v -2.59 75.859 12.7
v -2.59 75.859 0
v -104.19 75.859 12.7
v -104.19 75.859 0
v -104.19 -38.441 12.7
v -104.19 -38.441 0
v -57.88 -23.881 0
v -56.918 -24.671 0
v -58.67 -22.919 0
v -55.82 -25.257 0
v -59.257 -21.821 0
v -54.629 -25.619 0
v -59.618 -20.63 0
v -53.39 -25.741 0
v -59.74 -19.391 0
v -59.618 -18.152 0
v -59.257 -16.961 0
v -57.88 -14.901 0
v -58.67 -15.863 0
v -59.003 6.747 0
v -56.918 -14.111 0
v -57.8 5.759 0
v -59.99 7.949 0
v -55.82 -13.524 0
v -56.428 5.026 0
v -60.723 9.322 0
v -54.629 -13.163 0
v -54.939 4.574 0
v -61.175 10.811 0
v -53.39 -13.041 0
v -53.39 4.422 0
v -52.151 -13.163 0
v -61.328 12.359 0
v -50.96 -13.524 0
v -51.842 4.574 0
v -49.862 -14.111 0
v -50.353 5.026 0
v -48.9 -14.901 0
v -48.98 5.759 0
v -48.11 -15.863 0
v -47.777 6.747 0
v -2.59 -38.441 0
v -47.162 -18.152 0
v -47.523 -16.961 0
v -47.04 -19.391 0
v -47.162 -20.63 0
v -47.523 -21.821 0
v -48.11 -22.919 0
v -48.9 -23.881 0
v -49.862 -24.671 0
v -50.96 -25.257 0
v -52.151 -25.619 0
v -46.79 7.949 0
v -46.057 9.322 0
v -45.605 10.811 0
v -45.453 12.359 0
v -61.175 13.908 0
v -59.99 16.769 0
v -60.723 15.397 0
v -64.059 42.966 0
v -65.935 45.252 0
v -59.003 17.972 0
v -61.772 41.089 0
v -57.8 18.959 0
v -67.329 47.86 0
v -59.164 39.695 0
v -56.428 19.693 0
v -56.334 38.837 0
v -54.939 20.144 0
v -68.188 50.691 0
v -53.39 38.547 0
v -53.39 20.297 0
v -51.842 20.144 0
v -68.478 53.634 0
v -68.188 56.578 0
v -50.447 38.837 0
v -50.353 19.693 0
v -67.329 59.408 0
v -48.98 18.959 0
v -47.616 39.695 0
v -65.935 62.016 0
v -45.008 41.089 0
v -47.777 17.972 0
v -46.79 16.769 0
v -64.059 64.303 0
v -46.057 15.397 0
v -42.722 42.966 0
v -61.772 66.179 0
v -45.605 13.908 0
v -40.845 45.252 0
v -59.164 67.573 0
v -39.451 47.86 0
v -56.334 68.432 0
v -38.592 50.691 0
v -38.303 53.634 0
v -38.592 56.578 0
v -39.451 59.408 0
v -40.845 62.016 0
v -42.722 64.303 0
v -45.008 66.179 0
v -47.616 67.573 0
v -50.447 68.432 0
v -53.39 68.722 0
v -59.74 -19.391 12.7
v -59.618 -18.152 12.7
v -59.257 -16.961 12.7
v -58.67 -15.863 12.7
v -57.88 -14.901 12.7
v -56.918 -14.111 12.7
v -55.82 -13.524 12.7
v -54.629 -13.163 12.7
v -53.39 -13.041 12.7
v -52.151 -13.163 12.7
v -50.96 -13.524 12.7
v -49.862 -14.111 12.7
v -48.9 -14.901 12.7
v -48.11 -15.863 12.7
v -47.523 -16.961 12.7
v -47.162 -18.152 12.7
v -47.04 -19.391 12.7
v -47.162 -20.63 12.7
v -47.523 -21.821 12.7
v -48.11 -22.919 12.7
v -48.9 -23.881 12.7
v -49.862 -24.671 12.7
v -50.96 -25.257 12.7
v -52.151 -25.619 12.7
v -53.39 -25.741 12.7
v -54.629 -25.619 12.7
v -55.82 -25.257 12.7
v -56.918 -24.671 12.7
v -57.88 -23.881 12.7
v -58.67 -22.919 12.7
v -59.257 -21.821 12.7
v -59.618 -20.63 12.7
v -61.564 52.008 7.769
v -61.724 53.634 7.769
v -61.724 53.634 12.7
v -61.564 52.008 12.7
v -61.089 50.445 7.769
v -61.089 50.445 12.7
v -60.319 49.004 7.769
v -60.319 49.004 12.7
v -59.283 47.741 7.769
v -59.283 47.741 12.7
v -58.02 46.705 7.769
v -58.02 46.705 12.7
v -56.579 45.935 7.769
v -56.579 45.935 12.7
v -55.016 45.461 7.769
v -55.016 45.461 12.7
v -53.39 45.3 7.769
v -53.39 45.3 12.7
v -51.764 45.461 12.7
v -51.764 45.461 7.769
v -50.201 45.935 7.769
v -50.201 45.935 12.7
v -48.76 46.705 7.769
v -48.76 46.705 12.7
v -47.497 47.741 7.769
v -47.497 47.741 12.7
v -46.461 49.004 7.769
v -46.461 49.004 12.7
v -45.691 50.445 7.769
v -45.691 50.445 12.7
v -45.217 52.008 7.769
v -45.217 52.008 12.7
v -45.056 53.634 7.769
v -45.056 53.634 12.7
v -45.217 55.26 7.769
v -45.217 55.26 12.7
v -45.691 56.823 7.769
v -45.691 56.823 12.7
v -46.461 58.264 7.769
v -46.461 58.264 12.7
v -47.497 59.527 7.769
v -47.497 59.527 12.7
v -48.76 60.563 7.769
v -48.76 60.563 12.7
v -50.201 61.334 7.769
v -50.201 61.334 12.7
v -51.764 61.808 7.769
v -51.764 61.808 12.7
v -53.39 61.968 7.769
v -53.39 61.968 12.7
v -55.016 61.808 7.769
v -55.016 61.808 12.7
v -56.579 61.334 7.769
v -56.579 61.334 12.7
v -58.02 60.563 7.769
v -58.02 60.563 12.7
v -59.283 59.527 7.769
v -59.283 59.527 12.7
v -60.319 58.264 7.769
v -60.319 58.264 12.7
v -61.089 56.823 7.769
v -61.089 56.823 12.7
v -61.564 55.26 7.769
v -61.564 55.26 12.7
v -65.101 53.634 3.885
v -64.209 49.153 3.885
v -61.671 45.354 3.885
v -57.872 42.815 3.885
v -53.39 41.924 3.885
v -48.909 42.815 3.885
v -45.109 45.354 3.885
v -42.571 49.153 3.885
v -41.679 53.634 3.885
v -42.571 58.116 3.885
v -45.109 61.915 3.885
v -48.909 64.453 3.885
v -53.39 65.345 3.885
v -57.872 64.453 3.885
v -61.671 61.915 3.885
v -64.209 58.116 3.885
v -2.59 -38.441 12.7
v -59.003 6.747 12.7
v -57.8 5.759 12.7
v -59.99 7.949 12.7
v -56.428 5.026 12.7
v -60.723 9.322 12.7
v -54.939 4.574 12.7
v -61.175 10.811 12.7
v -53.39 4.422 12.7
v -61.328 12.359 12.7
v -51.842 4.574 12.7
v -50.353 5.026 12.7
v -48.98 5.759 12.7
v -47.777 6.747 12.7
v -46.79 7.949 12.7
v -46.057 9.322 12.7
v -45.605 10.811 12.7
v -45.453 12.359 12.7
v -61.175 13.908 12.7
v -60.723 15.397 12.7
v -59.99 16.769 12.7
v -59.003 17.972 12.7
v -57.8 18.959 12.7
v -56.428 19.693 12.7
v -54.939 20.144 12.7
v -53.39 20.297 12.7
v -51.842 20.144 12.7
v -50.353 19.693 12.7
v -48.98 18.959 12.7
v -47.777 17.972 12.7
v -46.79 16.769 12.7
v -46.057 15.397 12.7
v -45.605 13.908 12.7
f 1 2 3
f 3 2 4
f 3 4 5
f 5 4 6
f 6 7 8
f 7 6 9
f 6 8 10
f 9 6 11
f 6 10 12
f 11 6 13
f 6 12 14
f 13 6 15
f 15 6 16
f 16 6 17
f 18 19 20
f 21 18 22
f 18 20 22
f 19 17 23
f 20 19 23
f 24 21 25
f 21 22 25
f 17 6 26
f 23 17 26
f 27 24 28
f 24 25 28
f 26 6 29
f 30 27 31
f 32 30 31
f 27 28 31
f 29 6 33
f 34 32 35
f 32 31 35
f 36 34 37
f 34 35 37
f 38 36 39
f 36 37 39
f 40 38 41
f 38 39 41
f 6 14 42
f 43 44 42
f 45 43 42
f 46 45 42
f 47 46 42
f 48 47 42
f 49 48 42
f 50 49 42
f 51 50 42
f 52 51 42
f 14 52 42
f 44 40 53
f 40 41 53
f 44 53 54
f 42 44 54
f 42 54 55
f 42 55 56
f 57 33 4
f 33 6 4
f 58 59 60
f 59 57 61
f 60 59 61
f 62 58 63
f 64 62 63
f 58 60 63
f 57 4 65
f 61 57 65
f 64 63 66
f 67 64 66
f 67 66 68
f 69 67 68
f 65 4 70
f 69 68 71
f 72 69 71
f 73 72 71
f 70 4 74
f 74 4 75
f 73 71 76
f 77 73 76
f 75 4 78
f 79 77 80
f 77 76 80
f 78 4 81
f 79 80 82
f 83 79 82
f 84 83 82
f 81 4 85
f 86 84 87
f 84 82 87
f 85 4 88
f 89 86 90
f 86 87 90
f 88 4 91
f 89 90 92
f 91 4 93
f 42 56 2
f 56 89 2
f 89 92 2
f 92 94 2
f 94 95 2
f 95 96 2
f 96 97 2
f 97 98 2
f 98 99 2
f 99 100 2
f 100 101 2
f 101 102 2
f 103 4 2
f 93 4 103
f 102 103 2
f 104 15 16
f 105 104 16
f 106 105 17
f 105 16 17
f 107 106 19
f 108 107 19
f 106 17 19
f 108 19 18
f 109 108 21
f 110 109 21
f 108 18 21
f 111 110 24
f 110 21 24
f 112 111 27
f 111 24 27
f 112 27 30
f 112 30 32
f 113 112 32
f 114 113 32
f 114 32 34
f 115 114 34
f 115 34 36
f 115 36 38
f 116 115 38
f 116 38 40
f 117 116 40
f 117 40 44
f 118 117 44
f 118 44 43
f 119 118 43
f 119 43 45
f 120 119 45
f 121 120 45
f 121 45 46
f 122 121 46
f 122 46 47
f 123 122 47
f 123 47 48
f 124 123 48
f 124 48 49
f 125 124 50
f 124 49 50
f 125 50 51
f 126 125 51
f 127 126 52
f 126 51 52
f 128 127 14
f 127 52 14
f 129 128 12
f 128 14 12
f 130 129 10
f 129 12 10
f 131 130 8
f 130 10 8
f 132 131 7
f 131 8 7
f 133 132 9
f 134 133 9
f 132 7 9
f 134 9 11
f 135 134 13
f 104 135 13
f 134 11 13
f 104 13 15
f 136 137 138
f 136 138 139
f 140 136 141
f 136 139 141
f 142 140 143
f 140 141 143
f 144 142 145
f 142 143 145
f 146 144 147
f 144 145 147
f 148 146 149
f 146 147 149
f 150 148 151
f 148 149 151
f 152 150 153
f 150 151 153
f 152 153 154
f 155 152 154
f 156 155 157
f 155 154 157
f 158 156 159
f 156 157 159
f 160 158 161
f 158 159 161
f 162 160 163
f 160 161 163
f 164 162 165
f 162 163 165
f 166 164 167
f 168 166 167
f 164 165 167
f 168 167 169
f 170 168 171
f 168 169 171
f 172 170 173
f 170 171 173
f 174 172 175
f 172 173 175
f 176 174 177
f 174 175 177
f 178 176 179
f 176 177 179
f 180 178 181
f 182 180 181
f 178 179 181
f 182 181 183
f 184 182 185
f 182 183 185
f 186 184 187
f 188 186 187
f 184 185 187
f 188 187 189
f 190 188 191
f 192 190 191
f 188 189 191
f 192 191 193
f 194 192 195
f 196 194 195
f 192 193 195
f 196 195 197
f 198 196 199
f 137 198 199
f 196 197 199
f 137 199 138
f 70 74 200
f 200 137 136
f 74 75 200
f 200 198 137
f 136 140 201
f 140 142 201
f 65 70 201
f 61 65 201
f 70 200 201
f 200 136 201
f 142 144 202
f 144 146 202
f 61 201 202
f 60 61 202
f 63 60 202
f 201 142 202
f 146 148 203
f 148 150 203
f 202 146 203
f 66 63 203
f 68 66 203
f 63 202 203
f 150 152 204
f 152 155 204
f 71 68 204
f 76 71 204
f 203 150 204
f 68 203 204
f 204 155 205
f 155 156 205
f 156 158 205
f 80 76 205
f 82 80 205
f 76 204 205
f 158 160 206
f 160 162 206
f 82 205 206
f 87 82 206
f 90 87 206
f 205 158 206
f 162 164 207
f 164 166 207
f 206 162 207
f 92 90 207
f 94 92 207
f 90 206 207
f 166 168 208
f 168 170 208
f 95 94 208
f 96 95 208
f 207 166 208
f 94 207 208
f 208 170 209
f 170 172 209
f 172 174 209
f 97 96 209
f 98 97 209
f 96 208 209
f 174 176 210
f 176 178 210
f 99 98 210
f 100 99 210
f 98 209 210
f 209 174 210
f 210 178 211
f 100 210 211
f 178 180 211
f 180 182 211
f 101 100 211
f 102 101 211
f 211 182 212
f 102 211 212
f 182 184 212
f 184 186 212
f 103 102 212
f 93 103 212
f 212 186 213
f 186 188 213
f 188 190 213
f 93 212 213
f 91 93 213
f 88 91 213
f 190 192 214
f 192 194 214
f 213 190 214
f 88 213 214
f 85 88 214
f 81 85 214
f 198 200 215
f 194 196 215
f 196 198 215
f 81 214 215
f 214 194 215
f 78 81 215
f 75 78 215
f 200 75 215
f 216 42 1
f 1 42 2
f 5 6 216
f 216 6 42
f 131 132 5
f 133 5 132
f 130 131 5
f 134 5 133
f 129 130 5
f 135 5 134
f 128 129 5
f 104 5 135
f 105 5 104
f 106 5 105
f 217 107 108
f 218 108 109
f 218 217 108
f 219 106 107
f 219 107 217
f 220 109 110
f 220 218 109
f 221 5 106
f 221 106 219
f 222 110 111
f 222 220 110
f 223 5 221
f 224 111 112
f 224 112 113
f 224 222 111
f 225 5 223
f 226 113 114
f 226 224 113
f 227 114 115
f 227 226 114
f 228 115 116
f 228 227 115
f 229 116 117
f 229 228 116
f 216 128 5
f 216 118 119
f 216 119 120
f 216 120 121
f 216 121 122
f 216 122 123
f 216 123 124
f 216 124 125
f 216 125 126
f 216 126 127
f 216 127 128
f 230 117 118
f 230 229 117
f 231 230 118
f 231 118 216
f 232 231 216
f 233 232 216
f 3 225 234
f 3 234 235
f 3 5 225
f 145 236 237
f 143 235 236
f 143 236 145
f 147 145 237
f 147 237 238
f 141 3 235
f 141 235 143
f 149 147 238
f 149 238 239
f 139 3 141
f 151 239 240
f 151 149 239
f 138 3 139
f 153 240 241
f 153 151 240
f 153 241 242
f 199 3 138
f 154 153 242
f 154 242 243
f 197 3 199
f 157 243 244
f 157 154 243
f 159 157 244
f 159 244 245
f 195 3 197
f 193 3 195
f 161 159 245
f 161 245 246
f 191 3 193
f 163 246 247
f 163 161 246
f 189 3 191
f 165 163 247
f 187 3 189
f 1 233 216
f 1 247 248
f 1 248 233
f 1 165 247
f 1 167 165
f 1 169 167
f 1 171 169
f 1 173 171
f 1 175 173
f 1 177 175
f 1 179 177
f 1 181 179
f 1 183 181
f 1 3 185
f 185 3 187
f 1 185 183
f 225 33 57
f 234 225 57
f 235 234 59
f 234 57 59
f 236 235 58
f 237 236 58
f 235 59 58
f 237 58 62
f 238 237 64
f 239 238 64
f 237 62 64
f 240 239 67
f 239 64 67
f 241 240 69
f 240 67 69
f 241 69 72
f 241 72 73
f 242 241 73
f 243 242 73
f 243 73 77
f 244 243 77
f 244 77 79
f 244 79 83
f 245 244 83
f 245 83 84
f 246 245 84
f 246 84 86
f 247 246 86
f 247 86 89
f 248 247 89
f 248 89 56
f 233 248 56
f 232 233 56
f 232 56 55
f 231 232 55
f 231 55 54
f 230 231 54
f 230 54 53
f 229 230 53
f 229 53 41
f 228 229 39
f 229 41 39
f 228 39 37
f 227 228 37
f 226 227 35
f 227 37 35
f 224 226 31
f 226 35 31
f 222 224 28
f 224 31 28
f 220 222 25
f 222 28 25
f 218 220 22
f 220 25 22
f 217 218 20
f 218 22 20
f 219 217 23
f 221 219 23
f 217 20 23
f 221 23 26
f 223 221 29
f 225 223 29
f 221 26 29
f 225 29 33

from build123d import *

# Parameters (mm, degrees)
F0_R           = 1.27
F1_DEPTH       = 12.7
F3_D           = 15.875
F5_D           = 16.66748
F5_CSINK_D     = 30.1752
F5_CSINK_ANGLE = 82
F7_D           = 12.7


# Not quite as in the source:
# - a feature names something its author has since deleted; it is built from what else it names


with BuildPart() as f1:
    # F0 (on Top) → F1 (new body)
    with BuildSketch(Plane.XY):
        Polygon((-2.5901260614, -38.4407882191), (-2.5901260614, 12.3592117809), (-2.5901260614, 63.1592117809), (-2.5901260614, 75.8592117809), (-104.1901260614, 75.8592117809), (-104.1901260614, 63.1592117809), (-104.1901260614, -38.4407882191), align=None)
        with Locations((-85.1401260614, 12.3592117809)):
            Circle(F0_R, mode=Mode.SUBTRACT)
        with Locations((-78.4163327398, -7.1792497576)):
            Circle(F0_R, mode=Mode.SUBTRACT)
        with Locations((-53.3901260614, -19.3907882191)):
            Circle(F0_R, mode=Mode.SUBTRACT)
        with Locations((-53.3901260614, 12.3592117809)):
            Circle(F0_R, mode=Mode.SUBTRACT)
        with Locations((-23.1804483045, 2.5899810116)):
            Circle(F0_R, mode=Mode.SUBTRACT)
        with BuildLine():
            ThreePointArc((-13.3851260614, 12.3592117809), (-12.1151260614, 13.6292117809), (-10.8451260614, 12.3592117809))
            ThreePointArc((-10.8451260614, 12.3592117809), (-12.1151260614, 11.0892117809), (-13.3851260614, 12.3592117809))
        make_face(mode=Mode.SUBTRACT)
        with Locations((-92.6627071454, 25.0592117809)):
            Circle(F0_R, mode=Mode.SUBTRACT)
        with Locations((-20.8560573795, 37.7592117809)):
            Circle(F0_R, mode=Mode.SUBTRACT)
        with Locations((-53.3901260614, 53.6342117809)):
            Circle(F0_R, mode=Mode.SUBTRACT)
        with Locations((-92.6627071454, 25.0592117809)):
            Circle(F0_R)
        with Locations((-85.1401260614, 12.3592117809)):
            Circle(F0_R)
        with Locations((-78.4163327398, -7.1792497576)):
            Circle(F0_R)
        with Locations((-23.1804483045, 2.5899810116)):
            Circle(F0_R)
        with Locations((-20.8560573795, 37.7592117809)):
            Circle(F0_R)
        with BuildLine():
            ThreePointArc((-13.3851260614, 12.3592117809), (-12.1151260614, 11.0892117809), (-10.8451260614, 12.3592117809))
            Line((-10.8451260614, 12.3592117809), (-13.3851260614, 12.3592117809))
        make_face()
        with BuildLine():
            Line((-13.3851260614, 12.3592117809), (-10.8451260614, 12.3592117809))
            ThreePointArc((-10.8451260614, 12.3592117809), (-12.1151260614, 13.6292117809), (-13.3851260614, 12.3592117809))
        make_face()
    extrude(amount=F1_DEPTH)

    # F3 (through all)
    with Locations(Plane.XY.offset(12.7)):
        with Locations((-53.3901260614, 12.3592117809)):
            Hole(F3_D / 2)

    # F5 (through all)
    with Locations(Plane(origin=(0, 0, 0), x_dir=(1, 0, 0), z_dir=(0, 0, -1))):
        with Locations((-53.3901260614, -53.6342117809)):
            CounterSinkHole(F5_D / 2, F5_CSINK_D / 2, counter_sink_angle=F5_CSINK_ANGLE)

    # F7 (through all)
    with Locations(Plane.XY.offset(12.7)):
        with Locations((-53.3901260614, -19.3907882191)):
            Hole(F7_D / 2)


solid = f1.part
